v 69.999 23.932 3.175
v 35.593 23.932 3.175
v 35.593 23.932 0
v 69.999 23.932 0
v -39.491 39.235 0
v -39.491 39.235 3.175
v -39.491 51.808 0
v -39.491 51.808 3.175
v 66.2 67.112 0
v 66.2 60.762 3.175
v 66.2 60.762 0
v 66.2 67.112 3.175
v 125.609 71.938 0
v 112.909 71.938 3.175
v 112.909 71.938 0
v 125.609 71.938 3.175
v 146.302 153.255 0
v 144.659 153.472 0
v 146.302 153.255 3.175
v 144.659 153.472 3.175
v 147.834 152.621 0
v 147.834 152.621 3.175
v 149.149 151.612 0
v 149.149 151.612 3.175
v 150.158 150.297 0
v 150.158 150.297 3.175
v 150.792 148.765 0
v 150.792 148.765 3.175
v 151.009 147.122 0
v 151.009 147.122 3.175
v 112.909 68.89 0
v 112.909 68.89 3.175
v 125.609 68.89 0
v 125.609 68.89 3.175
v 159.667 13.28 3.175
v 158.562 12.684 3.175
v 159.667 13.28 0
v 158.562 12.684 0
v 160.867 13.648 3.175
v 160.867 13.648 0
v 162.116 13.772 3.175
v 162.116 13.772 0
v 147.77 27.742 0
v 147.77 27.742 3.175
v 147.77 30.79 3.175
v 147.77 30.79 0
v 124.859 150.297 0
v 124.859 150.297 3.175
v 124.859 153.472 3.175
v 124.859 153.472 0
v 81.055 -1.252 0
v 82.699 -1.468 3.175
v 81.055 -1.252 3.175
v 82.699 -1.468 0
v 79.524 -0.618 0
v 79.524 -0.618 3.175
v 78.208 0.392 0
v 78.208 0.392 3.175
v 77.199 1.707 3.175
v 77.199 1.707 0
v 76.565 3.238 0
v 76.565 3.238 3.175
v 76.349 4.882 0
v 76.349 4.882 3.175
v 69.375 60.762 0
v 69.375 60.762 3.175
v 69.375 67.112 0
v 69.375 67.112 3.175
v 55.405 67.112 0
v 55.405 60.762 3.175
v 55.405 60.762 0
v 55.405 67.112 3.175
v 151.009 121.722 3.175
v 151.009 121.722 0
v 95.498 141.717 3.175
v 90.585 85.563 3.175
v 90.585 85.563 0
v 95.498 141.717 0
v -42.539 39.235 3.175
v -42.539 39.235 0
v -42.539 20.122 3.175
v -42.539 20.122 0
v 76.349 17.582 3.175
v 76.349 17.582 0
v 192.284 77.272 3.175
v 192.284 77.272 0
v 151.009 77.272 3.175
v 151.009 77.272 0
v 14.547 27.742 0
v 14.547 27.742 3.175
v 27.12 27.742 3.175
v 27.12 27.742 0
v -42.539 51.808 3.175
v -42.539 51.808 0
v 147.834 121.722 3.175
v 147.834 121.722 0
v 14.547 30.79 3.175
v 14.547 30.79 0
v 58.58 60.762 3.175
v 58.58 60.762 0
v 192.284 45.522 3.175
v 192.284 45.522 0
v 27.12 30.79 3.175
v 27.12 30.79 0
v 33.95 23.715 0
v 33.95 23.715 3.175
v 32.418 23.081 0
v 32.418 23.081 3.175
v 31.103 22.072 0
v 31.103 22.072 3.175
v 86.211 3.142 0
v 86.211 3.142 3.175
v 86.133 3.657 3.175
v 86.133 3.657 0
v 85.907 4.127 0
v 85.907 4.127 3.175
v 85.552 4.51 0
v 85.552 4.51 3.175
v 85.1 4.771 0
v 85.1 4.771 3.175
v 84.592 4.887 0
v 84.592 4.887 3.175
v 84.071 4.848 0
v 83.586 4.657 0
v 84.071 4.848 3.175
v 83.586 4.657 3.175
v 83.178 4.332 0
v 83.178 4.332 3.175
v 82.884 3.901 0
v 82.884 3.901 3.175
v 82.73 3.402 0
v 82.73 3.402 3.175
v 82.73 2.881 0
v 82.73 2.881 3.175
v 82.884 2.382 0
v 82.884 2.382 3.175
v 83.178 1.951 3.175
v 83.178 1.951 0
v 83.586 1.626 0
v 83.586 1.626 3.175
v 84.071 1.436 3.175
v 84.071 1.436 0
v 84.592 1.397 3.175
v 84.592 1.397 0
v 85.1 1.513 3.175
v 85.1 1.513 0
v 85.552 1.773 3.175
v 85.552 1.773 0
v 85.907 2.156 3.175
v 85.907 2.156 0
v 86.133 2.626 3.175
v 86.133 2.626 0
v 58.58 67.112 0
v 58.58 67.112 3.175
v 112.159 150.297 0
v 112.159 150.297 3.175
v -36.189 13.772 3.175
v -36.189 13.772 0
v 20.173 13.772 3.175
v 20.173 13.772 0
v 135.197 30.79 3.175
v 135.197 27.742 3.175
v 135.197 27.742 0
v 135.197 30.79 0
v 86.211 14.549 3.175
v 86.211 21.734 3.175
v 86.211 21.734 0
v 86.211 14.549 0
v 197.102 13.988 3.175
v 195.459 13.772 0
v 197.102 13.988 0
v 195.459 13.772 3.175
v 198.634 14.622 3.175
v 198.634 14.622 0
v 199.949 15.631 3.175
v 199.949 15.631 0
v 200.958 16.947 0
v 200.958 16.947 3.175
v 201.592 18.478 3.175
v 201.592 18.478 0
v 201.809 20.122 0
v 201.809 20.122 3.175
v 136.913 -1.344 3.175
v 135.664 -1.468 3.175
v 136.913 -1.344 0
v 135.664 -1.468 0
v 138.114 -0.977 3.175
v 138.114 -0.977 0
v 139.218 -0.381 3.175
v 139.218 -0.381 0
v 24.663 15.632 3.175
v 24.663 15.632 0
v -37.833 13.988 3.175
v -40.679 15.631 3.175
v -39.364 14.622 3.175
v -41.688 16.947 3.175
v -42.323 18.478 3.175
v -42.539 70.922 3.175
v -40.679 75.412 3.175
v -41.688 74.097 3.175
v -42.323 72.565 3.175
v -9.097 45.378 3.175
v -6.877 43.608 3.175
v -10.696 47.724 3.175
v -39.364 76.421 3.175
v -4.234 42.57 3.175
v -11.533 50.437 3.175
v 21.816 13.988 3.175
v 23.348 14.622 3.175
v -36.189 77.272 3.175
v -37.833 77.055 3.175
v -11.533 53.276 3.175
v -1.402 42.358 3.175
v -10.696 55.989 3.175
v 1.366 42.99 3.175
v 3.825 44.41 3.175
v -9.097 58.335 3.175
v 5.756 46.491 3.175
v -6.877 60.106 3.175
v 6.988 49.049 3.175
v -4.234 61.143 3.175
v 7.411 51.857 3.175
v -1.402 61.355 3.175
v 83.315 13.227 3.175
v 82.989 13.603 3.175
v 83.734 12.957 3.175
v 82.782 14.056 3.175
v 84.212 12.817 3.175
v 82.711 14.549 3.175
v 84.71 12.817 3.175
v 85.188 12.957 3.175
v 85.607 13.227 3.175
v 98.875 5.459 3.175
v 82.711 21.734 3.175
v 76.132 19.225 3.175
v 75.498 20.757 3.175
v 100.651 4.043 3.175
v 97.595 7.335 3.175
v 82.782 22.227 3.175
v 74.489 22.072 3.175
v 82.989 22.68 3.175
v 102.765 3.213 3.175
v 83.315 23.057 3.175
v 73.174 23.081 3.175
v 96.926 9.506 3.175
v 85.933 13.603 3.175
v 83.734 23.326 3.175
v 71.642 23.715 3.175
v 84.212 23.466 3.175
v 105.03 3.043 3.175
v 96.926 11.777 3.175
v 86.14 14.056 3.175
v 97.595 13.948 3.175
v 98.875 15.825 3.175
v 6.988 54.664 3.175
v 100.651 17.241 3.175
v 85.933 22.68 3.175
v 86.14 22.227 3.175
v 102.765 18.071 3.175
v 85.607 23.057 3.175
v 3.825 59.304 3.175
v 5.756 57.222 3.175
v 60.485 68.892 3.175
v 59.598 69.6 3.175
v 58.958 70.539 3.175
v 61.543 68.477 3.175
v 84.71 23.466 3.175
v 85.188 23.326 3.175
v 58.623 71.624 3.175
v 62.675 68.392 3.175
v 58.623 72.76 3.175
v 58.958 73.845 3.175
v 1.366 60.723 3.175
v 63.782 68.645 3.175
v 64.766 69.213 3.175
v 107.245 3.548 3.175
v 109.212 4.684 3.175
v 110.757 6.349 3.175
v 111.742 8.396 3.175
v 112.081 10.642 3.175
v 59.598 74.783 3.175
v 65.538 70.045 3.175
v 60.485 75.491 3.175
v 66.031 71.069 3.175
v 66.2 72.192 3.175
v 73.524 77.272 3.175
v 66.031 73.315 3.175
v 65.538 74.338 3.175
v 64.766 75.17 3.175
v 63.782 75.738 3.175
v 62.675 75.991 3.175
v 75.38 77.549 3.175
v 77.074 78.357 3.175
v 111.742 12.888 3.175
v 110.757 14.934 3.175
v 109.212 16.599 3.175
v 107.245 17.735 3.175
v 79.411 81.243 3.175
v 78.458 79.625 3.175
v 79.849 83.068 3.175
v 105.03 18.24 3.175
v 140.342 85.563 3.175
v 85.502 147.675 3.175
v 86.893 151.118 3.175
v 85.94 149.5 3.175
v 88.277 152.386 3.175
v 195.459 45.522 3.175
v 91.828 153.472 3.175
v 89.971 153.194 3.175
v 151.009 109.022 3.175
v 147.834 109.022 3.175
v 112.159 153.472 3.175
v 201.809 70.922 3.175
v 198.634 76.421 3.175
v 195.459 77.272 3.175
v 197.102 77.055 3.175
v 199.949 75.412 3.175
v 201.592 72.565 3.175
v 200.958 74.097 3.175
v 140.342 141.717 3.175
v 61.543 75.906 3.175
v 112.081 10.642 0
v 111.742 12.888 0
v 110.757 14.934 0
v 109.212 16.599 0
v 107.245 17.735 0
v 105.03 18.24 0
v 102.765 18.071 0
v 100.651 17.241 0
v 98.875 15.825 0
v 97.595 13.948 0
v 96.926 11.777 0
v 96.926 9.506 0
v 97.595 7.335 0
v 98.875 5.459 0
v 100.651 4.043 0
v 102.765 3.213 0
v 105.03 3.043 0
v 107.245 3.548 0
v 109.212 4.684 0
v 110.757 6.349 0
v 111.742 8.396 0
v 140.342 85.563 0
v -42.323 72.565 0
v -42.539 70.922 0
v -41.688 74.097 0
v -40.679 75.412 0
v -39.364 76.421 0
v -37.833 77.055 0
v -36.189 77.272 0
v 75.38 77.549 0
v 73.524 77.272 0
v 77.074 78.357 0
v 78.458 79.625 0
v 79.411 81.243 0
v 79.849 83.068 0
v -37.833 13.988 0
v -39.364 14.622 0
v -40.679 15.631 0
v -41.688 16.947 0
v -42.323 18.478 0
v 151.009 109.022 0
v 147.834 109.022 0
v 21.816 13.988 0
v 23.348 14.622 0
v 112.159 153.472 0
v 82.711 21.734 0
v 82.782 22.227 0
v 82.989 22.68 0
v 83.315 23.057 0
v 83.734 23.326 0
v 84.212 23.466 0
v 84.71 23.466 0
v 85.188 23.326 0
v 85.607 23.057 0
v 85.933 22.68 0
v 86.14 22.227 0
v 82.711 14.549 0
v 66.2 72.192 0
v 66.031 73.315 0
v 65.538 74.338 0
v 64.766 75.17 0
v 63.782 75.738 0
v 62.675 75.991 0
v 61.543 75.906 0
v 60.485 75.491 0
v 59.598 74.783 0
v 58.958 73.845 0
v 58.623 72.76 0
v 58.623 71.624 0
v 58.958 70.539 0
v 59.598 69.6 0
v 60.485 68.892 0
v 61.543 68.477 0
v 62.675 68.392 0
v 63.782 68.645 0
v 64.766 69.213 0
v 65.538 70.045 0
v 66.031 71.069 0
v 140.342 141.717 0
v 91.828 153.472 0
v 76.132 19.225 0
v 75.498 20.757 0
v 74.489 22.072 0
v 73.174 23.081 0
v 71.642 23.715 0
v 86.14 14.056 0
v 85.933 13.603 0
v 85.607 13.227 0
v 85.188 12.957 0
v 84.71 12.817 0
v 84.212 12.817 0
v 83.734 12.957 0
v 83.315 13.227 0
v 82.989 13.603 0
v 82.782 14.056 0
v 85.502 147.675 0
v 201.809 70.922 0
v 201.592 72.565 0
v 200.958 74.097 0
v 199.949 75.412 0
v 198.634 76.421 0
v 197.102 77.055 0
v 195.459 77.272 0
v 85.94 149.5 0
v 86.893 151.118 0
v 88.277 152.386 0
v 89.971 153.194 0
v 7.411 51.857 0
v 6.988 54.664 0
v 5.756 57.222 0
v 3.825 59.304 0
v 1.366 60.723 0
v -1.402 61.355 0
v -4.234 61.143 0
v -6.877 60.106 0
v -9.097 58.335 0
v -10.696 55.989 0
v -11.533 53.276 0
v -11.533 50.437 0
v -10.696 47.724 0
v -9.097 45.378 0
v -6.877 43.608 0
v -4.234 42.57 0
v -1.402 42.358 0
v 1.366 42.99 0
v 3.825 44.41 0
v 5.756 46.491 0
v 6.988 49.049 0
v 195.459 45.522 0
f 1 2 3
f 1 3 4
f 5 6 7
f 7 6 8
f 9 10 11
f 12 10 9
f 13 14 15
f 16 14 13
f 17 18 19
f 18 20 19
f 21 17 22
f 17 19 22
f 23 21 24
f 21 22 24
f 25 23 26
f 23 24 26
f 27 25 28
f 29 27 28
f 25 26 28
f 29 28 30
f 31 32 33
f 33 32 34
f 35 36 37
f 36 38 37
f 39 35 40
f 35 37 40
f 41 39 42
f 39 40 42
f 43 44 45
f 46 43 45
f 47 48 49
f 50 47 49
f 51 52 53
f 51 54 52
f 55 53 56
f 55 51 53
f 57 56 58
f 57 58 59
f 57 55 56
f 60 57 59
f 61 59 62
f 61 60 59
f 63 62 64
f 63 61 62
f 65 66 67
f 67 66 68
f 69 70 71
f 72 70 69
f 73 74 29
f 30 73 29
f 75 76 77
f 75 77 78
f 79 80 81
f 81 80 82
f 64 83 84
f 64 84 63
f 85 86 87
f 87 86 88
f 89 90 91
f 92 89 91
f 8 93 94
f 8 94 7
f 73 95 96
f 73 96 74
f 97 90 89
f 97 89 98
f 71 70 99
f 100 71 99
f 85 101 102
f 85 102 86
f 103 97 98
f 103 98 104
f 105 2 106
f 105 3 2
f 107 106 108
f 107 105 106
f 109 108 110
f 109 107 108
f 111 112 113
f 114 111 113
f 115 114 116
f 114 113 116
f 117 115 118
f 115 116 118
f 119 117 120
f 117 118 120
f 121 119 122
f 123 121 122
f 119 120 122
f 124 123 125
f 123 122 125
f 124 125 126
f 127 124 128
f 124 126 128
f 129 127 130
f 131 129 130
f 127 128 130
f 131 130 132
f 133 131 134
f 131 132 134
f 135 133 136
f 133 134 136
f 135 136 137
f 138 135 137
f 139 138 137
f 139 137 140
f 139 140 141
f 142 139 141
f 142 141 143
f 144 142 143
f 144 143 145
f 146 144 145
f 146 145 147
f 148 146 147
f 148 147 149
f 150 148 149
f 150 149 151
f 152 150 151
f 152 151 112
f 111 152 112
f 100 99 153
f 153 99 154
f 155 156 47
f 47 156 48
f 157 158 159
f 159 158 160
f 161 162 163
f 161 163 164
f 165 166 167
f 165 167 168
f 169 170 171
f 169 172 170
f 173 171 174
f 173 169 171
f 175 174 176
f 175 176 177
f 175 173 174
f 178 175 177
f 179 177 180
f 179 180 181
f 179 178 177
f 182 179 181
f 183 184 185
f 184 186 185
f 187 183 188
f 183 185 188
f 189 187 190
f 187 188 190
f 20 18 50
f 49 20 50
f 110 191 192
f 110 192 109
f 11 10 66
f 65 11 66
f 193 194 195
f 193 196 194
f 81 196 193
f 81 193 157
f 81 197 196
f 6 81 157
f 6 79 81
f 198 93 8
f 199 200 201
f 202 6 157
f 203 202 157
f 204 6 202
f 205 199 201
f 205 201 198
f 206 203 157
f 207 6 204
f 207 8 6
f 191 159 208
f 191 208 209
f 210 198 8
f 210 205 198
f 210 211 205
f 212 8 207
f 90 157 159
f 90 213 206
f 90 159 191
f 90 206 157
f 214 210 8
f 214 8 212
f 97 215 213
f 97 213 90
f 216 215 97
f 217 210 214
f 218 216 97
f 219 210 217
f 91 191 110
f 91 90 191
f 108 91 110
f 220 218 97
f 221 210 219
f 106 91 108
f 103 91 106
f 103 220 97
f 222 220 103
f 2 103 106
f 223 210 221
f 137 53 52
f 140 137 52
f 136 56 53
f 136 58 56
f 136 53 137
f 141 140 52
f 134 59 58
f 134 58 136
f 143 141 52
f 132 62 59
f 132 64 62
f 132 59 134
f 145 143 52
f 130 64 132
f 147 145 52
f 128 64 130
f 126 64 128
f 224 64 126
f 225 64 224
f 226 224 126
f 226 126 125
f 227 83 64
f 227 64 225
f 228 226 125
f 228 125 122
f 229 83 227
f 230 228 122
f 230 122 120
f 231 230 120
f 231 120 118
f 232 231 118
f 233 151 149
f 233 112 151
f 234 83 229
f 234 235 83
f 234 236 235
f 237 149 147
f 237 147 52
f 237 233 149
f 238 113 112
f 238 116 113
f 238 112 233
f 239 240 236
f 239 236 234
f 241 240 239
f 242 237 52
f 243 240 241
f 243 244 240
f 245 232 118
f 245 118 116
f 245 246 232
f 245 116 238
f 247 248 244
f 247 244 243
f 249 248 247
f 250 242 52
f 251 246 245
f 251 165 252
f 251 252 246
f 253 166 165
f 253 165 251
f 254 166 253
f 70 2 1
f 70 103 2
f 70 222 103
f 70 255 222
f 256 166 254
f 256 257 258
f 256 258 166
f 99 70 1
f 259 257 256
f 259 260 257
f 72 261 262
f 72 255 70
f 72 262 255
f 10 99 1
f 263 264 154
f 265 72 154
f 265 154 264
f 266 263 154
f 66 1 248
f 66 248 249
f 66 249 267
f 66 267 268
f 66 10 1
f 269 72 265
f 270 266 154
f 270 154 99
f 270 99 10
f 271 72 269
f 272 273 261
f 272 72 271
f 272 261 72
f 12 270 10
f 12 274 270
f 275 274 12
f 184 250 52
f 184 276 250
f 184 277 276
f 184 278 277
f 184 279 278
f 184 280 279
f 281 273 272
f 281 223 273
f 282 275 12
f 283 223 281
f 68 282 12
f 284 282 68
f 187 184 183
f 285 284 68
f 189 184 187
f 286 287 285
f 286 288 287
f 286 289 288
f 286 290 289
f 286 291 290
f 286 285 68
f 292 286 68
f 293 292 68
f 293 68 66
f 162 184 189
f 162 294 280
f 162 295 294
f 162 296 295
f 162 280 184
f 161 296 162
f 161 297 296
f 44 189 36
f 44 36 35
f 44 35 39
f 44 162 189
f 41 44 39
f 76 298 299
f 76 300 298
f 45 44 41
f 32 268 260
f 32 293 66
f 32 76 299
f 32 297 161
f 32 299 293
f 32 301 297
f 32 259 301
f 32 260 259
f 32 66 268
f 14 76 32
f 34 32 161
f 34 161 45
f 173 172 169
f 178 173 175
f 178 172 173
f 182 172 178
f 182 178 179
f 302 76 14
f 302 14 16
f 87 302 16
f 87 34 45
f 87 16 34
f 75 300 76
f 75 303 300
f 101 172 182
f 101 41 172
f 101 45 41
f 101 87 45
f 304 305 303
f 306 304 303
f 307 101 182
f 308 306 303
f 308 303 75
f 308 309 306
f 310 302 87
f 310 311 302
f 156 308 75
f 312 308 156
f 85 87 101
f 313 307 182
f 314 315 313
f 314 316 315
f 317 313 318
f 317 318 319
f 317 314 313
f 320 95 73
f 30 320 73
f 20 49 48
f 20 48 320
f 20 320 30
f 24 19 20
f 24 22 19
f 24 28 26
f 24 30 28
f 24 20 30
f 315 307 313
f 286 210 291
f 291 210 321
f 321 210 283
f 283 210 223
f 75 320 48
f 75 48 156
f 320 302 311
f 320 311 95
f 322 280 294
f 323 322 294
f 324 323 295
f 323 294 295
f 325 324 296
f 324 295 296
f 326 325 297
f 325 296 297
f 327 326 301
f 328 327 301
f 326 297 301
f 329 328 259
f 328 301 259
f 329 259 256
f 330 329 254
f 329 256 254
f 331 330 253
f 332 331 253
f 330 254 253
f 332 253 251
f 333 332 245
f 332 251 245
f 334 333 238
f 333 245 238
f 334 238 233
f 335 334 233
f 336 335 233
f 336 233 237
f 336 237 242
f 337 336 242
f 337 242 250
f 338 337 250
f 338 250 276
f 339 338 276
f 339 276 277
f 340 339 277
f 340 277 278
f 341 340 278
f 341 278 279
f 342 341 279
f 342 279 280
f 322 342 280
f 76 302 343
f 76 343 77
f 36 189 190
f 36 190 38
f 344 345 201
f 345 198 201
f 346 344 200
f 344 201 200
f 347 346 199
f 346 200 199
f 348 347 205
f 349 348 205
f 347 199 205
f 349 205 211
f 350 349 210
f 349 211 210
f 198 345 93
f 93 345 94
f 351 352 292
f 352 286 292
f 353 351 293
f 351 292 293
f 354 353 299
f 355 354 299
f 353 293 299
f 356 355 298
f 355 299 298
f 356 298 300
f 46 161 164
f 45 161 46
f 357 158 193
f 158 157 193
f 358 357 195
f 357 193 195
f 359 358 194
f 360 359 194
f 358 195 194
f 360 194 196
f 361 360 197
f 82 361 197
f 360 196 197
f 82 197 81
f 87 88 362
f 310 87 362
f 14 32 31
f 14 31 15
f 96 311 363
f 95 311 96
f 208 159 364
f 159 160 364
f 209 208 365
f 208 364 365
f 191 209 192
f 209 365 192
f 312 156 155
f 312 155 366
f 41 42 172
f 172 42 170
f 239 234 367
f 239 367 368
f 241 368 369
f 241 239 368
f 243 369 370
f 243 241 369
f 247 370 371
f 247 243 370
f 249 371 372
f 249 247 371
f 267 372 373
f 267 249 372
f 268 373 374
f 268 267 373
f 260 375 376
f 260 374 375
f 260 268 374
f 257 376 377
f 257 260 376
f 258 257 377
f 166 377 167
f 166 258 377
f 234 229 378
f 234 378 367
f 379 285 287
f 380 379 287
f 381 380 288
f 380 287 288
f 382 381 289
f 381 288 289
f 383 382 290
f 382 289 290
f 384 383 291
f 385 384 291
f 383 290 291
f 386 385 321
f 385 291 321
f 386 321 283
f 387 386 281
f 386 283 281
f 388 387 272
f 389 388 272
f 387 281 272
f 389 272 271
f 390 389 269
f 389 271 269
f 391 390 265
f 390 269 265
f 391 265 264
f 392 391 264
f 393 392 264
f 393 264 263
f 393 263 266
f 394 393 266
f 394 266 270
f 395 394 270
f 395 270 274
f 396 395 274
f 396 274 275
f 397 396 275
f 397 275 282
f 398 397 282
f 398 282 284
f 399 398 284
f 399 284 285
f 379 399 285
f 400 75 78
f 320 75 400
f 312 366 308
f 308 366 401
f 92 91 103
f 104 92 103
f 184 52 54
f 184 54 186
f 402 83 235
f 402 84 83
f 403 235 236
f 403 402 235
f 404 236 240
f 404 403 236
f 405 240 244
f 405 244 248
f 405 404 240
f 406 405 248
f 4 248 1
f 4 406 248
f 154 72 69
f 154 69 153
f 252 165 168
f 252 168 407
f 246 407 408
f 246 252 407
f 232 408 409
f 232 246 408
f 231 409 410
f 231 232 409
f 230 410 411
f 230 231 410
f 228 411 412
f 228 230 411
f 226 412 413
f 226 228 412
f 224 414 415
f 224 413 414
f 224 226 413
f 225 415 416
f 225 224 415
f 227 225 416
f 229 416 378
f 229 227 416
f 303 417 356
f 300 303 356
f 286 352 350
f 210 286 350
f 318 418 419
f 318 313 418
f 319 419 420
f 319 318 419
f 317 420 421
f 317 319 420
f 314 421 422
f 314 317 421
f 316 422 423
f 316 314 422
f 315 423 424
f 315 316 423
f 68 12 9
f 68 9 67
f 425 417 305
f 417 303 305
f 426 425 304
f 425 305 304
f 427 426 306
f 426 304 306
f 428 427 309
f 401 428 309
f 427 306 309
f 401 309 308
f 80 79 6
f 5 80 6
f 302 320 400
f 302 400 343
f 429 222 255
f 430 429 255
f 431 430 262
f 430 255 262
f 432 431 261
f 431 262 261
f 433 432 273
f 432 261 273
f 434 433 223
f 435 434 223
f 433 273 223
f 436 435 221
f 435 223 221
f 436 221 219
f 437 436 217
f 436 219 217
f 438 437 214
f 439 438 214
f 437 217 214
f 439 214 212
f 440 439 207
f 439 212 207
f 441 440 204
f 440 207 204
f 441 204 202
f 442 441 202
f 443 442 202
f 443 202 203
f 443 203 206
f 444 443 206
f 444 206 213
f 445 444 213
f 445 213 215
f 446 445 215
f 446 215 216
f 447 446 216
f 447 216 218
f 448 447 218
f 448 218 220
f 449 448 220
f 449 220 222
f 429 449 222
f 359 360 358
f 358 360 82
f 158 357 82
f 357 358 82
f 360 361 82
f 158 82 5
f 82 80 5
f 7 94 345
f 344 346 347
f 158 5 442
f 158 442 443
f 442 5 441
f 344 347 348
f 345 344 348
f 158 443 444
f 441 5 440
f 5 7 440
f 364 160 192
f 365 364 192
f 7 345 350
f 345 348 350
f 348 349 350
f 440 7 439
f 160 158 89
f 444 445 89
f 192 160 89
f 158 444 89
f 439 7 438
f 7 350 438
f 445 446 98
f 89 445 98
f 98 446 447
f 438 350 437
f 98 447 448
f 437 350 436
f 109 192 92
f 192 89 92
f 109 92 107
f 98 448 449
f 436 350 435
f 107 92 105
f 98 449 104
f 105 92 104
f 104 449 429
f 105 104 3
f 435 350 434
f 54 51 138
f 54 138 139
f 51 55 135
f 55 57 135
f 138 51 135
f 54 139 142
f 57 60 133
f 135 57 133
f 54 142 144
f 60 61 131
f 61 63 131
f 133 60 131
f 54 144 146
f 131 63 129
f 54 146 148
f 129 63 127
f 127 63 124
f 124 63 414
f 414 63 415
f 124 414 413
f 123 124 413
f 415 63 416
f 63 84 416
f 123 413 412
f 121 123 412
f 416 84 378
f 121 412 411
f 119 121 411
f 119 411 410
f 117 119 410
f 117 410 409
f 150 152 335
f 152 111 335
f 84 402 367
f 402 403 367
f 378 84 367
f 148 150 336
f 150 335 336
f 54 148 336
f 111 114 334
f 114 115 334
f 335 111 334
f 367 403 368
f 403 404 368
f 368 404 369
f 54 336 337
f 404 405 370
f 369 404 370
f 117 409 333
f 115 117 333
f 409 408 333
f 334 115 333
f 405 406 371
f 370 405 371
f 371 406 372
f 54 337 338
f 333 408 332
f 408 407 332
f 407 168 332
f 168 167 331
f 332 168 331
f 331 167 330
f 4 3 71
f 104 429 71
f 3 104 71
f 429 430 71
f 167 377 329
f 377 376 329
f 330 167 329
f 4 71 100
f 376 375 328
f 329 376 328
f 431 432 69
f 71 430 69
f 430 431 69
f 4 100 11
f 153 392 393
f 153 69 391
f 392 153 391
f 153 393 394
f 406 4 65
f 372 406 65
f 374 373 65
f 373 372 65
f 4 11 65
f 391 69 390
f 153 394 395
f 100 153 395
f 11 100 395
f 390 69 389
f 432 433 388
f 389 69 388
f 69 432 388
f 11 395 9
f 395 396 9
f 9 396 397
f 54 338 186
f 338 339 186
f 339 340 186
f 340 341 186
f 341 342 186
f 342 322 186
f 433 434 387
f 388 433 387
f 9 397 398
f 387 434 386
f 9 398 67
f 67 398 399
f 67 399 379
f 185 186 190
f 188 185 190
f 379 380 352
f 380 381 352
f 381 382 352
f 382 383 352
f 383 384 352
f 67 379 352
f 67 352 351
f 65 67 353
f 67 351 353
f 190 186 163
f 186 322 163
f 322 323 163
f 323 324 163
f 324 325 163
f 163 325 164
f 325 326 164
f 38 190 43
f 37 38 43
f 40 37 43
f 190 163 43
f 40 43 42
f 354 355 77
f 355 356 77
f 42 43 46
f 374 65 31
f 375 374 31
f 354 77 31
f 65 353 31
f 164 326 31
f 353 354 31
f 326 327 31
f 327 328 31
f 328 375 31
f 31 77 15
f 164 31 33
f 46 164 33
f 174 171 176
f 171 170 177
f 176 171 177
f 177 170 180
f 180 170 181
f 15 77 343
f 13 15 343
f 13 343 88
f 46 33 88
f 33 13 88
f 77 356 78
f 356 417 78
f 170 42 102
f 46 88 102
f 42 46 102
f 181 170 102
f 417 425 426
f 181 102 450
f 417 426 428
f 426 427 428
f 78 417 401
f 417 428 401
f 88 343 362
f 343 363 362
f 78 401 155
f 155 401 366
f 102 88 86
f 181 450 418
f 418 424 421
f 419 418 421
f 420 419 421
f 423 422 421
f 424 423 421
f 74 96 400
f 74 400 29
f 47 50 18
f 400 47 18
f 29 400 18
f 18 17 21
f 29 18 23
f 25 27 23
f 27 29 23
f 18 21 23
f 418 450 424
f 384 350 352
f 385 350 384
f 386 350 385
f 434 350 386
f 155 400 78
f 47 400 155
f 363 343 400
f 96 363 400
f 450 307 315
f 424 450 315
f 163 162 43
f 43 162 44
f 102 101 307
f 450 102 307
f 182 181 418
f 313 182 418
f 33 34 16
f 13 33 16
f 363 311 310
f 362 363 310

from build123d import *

# Parameters (mm, degrees)
MAIN_SIDE_DEPTH          = 3.175
SKETCH2_W                = 12.573
SKETCH2_H                = 3.048
BOTTOM_PLATE_HOLES_DEPTH = 254.555547868
SKETCH3_W                = 12.7
SKETCH3_H                = 3.048
CUT_EXTRUDE1_DEPTH       = 254.555547868
SKETCH4_W                = 3.048
SKETCH4_H                = 12.573
CUT_EXTRUDE2_DEPTH       = 254.555547868
SKETCH5_W                = 3.175
SKETCH5_H                = 31.75
CUT_EXTRUDE3_DEPTH       = 254.555547868
SKETCH6_R                = 9.525
CUT_EXTRUDE4_DEPTH       = 254.555547868
SKETCH7_W                = 12.7
SKETCH7_H                = 3.175
CUT_EXTRUDE5_DEPTH       = 254.555547868
SKETCH8_W                = 3.175
SKETCH8_H                = 12.7
CUT_EXTRUDE6_DEPTH       = 254.555547868
BOSS_EXTRUDE2_DEPTH      = 3.175
SKETCH10_R               = 1.75
SKETCH10_R_2             = 7.62
CUT_EXTRUDE7_DEPTH       = 254.555547868
FILLET1_R                = 6.35
SKETCH14_R               = 3.81
SKETCH14_W               = 3.175
SKETCH14_H               = 6.35
CUT_EXTRUDE8_DEPTH       = 254.555547868
CUT_EXTRUDE9_DEPTH       = 254.555547868
CUT_EXTRUDE10_DEPTH      = 254.555547868
FILLET2_R                = 6.35


with BuildPart() as part:
    # Sketch1 → Main Side (new body)
    with BuildSketch(Plane.XY):
        Polygon((62.123903317, 7.421650144), (131.966346795, 7.421650144), (147.472889282, 13.771650144), (201.808790274, 13.771650144), (201.808790274, 77.271650144), (151.008790274, 77.271650144), (151.008790274, 153.471650144), (86.008898009, 153.471650144), (79.342261849, 77.271650144), (-42.539209726, 77.271650144), (-42.539209726, 13.771650144), (46.617360741, 13.771650144), align=None)
    extrude(amount=MAIN_SIDE_DEPTH)

    # Sketch2 → Bottom Plate Holes (cut, through all)
    with BuildSketch(Plane.XY.offset(3.175)):
        with Locations((141.483790274, 29.265650144)):
            Rectangle(SKETCH2_W, SKETCH2_H)
        with Locations((20.833790274, 29.265650144)):
            Rectangle(SKETCH2_W, SKETCH2_H)
    extrude(amount=-BOTTOM_PLATE_HOLES_DEPTH, mode=Mode.SUBTRACT)

    # Sketch3 → Cut-Extrude1 (cut, through all)
    with BuildSketch(Plane.XY.offset(3.175)):
        with Locations((119.258790274, 70.413650144)):
            Rectangle(SKETCH3_W, SKETCH3_H)
    extrude(amount=-CUT_EXTRUDE1_DEPTH, mode=Mode.SUBTRACT)

    # Sketch4 → Cut-Extrude2 (cut, through all)
    with BuildSketch(Plane.XY.offset(3.175)):
        with Locations((-41.015209726, 45.521650144)):
            Rectangle(SKETCH4_W, SKETCH4_H)
    extrude(amount=-CUT_EXTRUDE2_DEPTH, mode=Mode.SUBTRACT)

    # Sketch5 → Cut-Extrude3 (cut, through all)
    with BuildSketch(Plane.XY.offset(3.175)):
        with Locations((193.871290274, 61.396650144)):
            Rectangle(SKETCH5_W, SKETCH5_H)
    extrude(amount=-CUT_EXTRUDE3_DEPTH, mode=Mode.SUBTRACT)

    # Sketch6 → Cut-Extrude4 (cut, through all)
    with BuildSketch(Plane.XY.offset(3.175)):
        with Locations((-2.114209726, 51.856650144)):
            Circle(SKETCH6_R)
    extrude(amount=-CUT_EXTRUDE4_DEPTH, mode=Mode.SUBTRACT)

    # Sketch7 → Cut-Extrude5 (cut, through all)
    with BuildSketch(Plane.XY.offset(3.175)):
        with Locations((118.508844141, 151.884150144)):
            Rectangle(SKETCH7_W, SKETCH7_H)
    extrude(amount=-CUT_EXTRUDE5_DEPTH, mode=Mode.SUBTRACT)

    # Sketch8 → Cut-Extrude6 (cut, through all)
    with BuildSketch(Plane.XY.offset(3.175)):
        with Locations((149.421290274, 115.371650144)):
            Rectangle(SKETCH8_W, SKETCH8_H)
    extrude(amount=-CUT_EXTRUDE6_DEPTH, mode=Mode.SUBTRACT)

    # Sketch13 → Boss-Extrude2 (add)
    with BuildSketch(Plane.XY.offset(3.175)):
        Polygon((33.917360741, 13.771650144), (56.482594802, -1.468349856), (137.607655293, -1.468349856), (160.172889282, 13.771650144), (147.472889282, 13.771650144), (131.966346795, 7.421650144), (62.123903317, 7.421650144), (46.617360741, 13.771650144), align=None)
    extrude(amount=-BOSS_EXTRUDE2_DEPTH)

    # Sketch10 → Cut-Extrude7 (cut, through all)
    with BuildSketch(Plane.XY.offset(3.175)):
        with Locations((84.460790274, 3.141650144)):
            Circle(SKETCH10_R)
        with Locations((104.460790274, 10.641650144)):
            Circle(SKETCH10_R_2)
        with BuildLine():
            Line((86.210790274, 21.734048116), (86.210790274, 14.549252171))
            ThreePointArc((86.210790274, 14.549252171), (84.460790274, 12.799252171), (82.710790274, 14.549252171))
            Line((82.710790274, 14.549252171), (82.710790274, 21.734048116))
            ThreePointArc((82.710790274, 21.734048116), (84.460790274, 23.484048116), (86.210790274, 21.734048116))
        make_face()
    extrude(amount=-CUT_EXTRUDE7_DEPTH, mode=Mode.SUBTRACT)

    # Fillet1
    fillet1_edges = [part.edges().sort_by_distance(p)[0] for p in [
        (33.917360741, 13.771650144, 1.5875),
        (160.172889282, 13.771650144, 1.5875),
        (137.607655293, -1.468349856, 1.5875),
        (56.482594802, -1.468349856, 1.5875),
        (-42.539209726, 13.771650144, 1.5875),
        (-42.539209726, 77.271650144, 1.5875),
        (79.342261849, 77.271650144, 1.5875),
        (86.008898009, 153.471650144, 1.5875),
        (151.008790274, 153.471650144, 1.5875),
        (201.808790274, 77.271650144, 1.5875),
        (201.808790274, 13.771650144, 1.5875),
    ]]
    fillet(fillet1_edges, radius=FILLET1_R - 0.0001)  # a hair under: the kernel refuses the full size

    # Sketch14 → Cut-Extrude8 (cut, through all)
    with BuildSketch(Plane.XY.offset(3.175)):
        with Locations((62.390480298, 6.151650144)):
            Circle(SKETCH14_R)
        with Locations((62.390480298, 72.191650144)):
            Circle(SKETCH14_R)
        with Locations((56.992980298, 63.936650144)):
            Rectangle(SKETCH14_W, SKETCH14_H)
        with Locations((67.787980298, 63.936650144)):
            Rectangle(SKETCH14_W, SKETCH14_H)
        with Locations((67.787980298, 14.406650144)):
            Rectangle(SKETCH14_W, SKETCH14_H)
        with Locations((56.992980298, 14.406650144)):
            Rectangle(SKETCH14_W, SKETCH14_H)
    extrude(amount=-CUT_EXTRUDE8_DEPTH, mode=Mode.SUBTRACT)

    # Sketch15 → Cut-Extrude9 (cut, through all)
    with BuildSketch(Plane.XY.offset(3.175)):
        Polygon((90.585226868, 85.563055457), (95.498090229, 141.717340628), (140.342125594, 141.717340628), (140.342125594, 85.563055457), align=None)
    extrude(amount=-CUT_EXTRUDE9_DEPTH, mode=Mode.SUBTRACT)

    # Sketch16 → Cut-Extrude10 (cut, through all)
    with BuildSketch(Plane.XY.offset(3.175)):
        Polygon((32.963134486, 23.931650144), (76.348530262, 23.931650144), (76.348530262, -1.468349856), (32.963134486, -1.468349856), (32.963134486, 12.534188724), (21.565673066, 12.534188724), align=None)
    extrude(amount=-CUT_EXTRUDE10_DEPTH, mode=Mode.SUBTRACT)

    # Fillet2
    fillet2_edges = [part.edges().sort_by_distance(p)[0] for p in [
        (22.803134486, 13.771650144, 1.5875),
        (76.348530262, -1.468349856, 1.5875),
        (32.963134486, 23.931650144, 1.5875),
        (76.348530262, 23.931650144, 1.5875),
    ]]
    fillet(fillet2_edges, radius=FILLET2_R)


solid = part.part
